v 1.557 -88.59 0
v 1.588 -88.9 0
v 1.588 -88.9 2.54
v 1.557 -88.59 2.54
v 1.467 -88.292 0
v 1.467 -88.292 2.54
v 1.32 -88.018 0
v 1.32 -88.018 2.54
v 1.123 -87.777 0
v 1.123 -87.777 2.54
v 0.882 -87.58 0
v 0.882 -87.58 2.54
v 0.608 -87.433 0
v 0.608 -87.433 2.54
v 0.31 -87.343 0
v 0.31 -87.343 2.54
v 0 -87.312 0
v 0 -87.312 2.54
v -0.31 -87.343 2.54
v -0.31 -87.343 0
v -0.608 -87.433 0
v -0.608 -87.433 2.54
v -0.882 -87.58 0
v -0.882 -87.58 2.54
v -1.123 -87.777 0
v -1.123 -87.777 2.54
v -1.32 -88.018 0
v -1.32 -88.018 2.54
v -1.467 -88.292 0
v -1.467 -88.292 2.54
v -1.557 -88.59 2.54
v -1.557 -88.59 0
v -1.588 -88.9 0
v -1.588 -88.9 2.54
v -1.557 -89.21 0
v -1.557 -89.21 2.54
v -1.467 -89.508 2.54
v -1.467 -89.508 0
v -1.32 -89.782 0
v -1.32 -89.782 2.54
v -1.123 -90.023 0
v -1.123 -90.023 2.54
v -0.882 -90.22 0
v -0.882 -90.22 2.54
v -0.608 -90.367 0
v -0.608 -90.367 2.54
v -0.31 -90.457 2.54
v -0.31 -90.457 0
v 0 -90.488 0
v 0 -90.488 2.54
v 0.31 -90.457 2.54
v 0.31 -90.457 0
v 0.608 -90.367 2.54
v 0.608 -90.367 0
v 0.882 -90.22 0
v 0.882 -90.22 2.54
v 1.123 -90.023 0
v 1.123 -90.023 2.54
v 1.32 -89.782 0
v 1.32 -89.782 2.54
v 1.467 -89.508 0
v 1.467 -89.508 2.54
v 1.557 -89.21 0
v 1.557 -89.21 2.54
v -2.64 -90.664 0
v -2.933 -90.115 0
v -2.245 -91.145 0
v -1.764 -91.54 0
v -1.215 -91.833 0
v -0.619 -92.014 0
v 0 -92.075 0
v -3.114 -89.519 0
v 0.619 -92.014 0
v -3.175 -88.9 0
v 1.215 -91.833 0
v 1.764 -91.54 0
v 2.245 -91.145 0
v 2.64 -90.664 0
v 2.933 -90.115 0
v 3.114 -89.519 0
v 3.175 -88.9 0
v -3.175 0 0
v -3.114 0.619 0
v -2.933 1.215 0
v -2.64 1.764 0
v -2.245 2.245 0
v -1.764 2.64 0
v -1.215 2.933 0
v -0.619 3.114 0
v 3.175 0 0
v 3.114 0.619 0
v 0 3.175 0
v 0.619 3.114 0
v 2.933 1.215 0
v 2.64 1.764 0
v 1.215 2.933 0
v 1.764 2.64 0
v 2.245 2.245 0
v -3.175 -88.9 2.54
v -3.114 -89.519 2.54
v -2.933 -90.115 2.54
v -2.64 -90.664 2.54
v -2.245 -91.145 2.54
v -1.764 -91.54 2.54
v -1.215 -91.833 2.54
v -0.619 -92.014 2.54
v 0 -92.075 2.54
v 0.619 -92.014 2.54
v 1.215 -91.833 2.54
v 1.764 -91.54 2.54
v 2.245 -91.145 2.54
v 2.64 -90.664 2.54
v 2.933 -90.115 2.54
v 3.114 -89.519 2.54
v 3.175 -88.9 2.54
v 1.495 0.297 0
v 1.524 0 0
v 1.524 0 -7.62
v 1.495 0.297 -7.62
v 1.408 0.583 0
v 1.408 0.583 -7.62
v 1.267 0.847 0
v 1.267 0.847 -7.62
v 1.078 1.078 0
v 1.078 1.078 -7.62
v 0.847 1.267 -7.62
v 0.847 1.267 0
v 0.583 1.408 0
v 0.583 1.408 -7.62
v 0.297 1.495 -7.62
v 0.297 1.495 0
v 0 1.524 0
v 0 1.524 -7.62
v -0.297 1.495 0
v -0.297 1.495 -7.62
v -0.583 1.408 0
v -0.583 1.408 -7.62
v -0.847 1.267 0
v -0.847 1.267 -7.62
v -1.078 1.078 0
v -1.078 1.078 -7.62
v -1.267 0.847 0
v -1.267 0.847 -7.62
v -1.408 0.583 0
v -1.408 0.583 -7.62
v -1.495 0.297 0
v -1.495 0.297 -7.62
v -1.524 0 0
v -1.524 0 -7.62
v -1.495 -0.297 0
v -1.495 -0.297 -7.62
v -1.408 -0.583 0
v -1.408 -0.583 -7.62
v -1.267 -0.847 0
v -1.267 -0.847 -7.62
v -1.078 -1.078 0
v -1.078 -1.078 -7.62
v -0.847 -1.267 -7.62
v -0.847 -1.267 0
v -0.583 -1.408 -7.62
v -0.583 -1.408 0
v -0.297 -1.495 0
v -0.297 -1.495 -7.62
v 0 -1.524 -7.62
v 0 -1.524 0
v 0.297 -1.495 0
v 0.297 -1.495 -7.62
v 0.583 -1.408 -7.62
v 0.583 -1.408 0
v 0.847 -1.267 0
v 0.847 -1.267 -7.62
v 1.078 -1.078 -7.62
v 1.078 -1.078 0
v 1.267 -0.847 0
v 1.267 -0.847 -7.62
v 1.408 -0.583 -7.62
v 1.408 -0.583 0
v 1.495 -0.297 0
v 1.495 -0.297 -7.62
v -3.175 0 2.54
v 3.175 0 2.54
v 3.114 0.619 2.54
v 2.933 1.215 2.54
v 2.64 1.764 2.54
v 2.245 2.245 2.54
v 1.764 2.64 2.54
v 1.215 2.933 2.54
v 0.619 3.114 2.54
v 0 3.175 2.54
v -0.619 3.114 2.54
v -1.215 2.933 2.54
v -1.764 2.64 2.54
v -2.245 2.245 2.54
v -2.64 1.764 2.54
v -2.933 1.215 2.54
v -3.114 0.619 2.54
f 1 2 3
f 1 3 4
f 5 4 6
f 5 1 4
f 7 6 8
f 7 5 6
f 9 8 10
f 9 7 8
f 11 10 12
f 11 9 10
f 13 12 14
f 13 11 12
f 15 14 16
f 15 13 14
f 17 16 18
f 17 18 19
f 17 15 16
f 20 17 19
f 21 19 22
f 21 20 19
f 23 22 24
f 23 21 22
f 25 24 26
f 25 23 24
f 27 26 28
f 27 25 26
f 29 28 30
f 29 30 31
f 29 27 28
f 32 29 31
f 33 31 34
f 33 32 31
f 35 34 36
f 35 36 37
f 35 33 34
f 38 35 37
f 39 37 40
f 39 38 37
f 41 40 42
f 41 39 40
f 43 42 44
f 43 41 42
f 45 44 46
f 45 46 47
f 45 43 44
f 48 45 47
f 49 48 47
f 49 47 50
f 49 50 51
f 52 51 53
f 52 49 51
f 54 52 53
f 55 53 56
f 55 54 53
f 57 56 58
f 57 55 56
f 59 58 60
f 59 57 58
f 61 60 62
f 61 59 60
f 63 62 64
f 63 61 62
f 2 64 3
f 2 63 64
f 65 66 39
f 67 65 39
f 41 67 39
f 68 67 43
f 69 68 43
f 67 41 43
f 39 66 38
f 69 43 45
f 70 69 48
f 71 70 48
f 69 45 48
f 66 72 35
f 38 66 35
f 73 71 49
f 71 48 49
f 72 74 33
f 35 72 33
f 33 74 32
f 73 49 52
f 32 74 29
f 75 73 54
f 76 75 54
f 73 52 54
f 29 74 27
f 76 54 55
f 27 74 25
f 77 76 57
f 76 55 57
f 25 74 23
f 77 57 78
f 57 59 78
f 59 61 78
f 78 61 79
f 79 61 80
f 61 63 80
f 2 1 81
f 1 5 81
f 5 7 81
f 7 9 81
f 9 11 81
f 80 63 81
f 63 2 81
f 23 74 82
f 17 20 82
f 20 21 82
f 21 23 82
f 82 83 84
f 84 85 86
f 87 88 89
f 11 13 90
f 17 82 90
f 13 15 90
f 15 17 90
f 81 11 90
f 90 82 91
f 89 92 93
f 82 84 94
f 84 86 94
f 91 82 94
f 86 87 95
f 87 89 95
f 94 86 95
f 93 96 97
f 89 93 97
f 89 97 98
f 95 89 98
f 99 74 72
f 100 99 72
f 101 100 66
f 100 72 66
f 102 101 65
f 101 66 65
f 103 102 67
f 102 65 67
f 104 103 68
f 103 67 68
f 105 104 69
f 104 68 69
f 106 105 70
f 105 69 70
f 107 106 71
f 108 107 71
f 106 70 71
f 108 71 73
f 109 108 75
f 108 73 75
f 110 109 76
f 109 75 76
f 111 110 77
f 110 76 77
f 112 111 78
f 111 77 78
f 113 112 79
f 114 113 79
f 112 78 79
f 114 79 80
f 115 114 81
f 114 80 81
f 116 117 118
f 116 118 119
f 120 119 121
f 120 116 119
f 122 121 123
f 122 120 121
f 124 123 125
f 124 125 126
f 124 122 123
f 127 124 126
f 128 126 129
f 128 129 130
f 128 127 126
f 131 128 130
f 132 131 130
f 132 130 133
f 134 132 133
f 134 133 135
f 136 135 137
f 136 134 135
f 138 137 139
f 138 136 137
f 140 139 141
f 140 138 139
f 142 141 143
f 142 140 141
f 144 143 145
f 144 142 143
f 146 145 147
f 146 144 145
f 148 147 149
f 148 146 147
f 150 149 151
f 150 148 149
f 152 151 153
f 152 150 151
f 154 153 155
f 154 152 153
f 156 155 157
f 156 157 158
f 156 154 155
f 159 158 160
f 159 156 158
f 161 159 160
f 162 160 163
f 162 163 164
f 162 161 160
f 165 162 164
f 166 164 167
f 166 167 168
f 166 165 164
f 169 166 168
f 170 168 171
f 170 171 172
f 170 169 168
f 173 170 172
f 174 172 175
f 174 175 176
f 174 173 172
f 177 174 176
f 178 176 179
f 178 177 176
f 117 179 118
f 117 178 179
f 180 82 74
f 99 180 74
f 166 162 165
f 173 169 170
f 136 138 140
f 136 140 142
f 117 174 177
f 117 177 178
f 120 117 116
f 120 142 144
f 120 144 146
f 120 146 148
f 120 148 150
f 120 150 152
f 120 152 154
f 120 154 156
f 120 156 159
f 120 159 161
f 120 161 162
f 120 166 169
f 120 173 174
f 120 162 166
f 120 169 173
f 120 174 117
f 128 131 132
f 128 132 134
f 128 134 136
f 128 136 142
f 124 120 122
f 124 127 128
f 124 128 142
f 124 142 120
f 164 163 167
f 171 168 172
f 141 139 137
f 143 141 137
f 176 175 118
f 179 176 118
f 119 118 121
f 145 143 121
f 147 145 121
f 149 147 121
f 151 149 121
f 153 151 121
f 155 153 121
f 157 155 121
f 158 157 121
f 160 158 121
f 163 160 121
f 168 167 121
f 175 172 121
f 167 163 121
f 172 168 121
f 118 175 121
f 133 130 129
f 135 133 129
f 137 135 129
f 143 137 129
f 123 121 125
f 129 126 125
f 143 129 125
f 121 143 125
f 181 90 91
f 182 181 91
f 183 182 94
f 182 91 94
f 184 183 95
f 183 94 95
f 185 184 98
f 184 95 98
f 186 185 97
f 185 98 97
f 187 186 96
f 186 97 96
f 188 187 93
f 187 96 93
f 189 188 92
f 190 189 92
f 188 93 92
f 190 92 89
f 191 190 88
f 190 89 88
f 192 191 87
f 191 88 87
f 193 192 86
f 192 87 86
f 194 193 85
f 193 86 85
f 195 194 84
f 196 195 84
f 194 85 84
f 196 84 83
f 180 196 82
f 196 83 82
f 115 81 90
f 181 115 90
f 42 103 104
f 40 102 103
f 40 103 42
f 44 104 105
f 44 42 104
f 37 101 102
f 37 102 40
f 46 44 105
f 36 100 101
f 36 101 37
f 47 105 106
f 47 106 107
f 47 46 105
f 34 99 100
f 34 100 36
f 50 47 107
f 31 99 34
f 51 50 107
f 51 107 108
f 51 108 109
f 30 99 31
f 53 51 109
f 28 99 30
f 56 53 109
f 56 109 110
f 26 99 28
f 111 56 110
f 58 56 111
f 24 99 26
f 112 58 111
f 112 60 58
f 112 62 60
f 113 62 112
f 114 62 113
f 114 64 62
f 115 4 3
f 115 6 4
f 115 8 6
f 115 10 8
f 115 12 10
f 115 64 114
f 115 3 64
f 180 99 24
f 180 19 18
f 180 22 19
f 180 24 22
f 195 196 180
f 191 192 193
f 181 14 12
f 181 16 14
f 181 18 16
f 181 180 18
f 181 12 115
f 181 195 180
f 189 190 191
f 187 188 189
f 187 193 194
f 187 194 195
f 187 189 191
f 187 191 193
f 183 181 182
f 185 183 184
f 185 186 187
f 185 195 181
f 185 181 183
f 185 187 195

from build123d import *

# Parameters (mm, degrees)
SKETCH1_R           = 1.5875
BOSS_EXTRUDE1_DEPTH = 2.54
BOSS_EXTRUDE2_START = -2.54
SKETCH2_R           = 1.524
BOSS_EXTRUDE2_DEPTH = 7.62
SKETCH3_R           = 1.5875
BOSS_EXTRUDE3_DEPTH = 2.54


with BuildPart() as part:
    # Sketch1 → Boss-Extrude1 (new body)
    with BuildSketch(Plane.XY):
        with BuildLine():
            Line((-3.175, 0), (-3.175, -88.9))
            ThreePointArc((-3.175, -88.9), (0, -92.075), (3.175, -88.9))
            Line((3.175, -88.9), (3.175, 0))
            ThreePointArc((3.175, 0), (0, 3.175), (-3.175, 0))
        make_face()
        Circle(SKETCH1_R, mode=Mode.SUBTRACT)
        with Locations((0, -88.9)):
            Circle(SKETCH1_R, mode=Mode.SUBTRACT)
    extrude(amount=BOSS_EXTRUDE1_DEPTH)

    # Sketch3 → Boss-Extrude3 (add)
    with BuildSketch(Plane.XY):
        Circle(SKETCH3_R)
    extrude(amount=BOSS_EXTRUDE3_DEPTH)


with BuildPart() as body_2:
    # Sketch2 → Boss-Extrude2 (new body)
    with BuildSketch(Plane.XY.offset(2.54).offset(BOSS_EXTRUDE2_START)):
        Circle(SKETCH2_R)
    extrude(amount=-BOSS_EXTRUDE2_DEPTH)


solid = Compound([part.part, body_2.part])
